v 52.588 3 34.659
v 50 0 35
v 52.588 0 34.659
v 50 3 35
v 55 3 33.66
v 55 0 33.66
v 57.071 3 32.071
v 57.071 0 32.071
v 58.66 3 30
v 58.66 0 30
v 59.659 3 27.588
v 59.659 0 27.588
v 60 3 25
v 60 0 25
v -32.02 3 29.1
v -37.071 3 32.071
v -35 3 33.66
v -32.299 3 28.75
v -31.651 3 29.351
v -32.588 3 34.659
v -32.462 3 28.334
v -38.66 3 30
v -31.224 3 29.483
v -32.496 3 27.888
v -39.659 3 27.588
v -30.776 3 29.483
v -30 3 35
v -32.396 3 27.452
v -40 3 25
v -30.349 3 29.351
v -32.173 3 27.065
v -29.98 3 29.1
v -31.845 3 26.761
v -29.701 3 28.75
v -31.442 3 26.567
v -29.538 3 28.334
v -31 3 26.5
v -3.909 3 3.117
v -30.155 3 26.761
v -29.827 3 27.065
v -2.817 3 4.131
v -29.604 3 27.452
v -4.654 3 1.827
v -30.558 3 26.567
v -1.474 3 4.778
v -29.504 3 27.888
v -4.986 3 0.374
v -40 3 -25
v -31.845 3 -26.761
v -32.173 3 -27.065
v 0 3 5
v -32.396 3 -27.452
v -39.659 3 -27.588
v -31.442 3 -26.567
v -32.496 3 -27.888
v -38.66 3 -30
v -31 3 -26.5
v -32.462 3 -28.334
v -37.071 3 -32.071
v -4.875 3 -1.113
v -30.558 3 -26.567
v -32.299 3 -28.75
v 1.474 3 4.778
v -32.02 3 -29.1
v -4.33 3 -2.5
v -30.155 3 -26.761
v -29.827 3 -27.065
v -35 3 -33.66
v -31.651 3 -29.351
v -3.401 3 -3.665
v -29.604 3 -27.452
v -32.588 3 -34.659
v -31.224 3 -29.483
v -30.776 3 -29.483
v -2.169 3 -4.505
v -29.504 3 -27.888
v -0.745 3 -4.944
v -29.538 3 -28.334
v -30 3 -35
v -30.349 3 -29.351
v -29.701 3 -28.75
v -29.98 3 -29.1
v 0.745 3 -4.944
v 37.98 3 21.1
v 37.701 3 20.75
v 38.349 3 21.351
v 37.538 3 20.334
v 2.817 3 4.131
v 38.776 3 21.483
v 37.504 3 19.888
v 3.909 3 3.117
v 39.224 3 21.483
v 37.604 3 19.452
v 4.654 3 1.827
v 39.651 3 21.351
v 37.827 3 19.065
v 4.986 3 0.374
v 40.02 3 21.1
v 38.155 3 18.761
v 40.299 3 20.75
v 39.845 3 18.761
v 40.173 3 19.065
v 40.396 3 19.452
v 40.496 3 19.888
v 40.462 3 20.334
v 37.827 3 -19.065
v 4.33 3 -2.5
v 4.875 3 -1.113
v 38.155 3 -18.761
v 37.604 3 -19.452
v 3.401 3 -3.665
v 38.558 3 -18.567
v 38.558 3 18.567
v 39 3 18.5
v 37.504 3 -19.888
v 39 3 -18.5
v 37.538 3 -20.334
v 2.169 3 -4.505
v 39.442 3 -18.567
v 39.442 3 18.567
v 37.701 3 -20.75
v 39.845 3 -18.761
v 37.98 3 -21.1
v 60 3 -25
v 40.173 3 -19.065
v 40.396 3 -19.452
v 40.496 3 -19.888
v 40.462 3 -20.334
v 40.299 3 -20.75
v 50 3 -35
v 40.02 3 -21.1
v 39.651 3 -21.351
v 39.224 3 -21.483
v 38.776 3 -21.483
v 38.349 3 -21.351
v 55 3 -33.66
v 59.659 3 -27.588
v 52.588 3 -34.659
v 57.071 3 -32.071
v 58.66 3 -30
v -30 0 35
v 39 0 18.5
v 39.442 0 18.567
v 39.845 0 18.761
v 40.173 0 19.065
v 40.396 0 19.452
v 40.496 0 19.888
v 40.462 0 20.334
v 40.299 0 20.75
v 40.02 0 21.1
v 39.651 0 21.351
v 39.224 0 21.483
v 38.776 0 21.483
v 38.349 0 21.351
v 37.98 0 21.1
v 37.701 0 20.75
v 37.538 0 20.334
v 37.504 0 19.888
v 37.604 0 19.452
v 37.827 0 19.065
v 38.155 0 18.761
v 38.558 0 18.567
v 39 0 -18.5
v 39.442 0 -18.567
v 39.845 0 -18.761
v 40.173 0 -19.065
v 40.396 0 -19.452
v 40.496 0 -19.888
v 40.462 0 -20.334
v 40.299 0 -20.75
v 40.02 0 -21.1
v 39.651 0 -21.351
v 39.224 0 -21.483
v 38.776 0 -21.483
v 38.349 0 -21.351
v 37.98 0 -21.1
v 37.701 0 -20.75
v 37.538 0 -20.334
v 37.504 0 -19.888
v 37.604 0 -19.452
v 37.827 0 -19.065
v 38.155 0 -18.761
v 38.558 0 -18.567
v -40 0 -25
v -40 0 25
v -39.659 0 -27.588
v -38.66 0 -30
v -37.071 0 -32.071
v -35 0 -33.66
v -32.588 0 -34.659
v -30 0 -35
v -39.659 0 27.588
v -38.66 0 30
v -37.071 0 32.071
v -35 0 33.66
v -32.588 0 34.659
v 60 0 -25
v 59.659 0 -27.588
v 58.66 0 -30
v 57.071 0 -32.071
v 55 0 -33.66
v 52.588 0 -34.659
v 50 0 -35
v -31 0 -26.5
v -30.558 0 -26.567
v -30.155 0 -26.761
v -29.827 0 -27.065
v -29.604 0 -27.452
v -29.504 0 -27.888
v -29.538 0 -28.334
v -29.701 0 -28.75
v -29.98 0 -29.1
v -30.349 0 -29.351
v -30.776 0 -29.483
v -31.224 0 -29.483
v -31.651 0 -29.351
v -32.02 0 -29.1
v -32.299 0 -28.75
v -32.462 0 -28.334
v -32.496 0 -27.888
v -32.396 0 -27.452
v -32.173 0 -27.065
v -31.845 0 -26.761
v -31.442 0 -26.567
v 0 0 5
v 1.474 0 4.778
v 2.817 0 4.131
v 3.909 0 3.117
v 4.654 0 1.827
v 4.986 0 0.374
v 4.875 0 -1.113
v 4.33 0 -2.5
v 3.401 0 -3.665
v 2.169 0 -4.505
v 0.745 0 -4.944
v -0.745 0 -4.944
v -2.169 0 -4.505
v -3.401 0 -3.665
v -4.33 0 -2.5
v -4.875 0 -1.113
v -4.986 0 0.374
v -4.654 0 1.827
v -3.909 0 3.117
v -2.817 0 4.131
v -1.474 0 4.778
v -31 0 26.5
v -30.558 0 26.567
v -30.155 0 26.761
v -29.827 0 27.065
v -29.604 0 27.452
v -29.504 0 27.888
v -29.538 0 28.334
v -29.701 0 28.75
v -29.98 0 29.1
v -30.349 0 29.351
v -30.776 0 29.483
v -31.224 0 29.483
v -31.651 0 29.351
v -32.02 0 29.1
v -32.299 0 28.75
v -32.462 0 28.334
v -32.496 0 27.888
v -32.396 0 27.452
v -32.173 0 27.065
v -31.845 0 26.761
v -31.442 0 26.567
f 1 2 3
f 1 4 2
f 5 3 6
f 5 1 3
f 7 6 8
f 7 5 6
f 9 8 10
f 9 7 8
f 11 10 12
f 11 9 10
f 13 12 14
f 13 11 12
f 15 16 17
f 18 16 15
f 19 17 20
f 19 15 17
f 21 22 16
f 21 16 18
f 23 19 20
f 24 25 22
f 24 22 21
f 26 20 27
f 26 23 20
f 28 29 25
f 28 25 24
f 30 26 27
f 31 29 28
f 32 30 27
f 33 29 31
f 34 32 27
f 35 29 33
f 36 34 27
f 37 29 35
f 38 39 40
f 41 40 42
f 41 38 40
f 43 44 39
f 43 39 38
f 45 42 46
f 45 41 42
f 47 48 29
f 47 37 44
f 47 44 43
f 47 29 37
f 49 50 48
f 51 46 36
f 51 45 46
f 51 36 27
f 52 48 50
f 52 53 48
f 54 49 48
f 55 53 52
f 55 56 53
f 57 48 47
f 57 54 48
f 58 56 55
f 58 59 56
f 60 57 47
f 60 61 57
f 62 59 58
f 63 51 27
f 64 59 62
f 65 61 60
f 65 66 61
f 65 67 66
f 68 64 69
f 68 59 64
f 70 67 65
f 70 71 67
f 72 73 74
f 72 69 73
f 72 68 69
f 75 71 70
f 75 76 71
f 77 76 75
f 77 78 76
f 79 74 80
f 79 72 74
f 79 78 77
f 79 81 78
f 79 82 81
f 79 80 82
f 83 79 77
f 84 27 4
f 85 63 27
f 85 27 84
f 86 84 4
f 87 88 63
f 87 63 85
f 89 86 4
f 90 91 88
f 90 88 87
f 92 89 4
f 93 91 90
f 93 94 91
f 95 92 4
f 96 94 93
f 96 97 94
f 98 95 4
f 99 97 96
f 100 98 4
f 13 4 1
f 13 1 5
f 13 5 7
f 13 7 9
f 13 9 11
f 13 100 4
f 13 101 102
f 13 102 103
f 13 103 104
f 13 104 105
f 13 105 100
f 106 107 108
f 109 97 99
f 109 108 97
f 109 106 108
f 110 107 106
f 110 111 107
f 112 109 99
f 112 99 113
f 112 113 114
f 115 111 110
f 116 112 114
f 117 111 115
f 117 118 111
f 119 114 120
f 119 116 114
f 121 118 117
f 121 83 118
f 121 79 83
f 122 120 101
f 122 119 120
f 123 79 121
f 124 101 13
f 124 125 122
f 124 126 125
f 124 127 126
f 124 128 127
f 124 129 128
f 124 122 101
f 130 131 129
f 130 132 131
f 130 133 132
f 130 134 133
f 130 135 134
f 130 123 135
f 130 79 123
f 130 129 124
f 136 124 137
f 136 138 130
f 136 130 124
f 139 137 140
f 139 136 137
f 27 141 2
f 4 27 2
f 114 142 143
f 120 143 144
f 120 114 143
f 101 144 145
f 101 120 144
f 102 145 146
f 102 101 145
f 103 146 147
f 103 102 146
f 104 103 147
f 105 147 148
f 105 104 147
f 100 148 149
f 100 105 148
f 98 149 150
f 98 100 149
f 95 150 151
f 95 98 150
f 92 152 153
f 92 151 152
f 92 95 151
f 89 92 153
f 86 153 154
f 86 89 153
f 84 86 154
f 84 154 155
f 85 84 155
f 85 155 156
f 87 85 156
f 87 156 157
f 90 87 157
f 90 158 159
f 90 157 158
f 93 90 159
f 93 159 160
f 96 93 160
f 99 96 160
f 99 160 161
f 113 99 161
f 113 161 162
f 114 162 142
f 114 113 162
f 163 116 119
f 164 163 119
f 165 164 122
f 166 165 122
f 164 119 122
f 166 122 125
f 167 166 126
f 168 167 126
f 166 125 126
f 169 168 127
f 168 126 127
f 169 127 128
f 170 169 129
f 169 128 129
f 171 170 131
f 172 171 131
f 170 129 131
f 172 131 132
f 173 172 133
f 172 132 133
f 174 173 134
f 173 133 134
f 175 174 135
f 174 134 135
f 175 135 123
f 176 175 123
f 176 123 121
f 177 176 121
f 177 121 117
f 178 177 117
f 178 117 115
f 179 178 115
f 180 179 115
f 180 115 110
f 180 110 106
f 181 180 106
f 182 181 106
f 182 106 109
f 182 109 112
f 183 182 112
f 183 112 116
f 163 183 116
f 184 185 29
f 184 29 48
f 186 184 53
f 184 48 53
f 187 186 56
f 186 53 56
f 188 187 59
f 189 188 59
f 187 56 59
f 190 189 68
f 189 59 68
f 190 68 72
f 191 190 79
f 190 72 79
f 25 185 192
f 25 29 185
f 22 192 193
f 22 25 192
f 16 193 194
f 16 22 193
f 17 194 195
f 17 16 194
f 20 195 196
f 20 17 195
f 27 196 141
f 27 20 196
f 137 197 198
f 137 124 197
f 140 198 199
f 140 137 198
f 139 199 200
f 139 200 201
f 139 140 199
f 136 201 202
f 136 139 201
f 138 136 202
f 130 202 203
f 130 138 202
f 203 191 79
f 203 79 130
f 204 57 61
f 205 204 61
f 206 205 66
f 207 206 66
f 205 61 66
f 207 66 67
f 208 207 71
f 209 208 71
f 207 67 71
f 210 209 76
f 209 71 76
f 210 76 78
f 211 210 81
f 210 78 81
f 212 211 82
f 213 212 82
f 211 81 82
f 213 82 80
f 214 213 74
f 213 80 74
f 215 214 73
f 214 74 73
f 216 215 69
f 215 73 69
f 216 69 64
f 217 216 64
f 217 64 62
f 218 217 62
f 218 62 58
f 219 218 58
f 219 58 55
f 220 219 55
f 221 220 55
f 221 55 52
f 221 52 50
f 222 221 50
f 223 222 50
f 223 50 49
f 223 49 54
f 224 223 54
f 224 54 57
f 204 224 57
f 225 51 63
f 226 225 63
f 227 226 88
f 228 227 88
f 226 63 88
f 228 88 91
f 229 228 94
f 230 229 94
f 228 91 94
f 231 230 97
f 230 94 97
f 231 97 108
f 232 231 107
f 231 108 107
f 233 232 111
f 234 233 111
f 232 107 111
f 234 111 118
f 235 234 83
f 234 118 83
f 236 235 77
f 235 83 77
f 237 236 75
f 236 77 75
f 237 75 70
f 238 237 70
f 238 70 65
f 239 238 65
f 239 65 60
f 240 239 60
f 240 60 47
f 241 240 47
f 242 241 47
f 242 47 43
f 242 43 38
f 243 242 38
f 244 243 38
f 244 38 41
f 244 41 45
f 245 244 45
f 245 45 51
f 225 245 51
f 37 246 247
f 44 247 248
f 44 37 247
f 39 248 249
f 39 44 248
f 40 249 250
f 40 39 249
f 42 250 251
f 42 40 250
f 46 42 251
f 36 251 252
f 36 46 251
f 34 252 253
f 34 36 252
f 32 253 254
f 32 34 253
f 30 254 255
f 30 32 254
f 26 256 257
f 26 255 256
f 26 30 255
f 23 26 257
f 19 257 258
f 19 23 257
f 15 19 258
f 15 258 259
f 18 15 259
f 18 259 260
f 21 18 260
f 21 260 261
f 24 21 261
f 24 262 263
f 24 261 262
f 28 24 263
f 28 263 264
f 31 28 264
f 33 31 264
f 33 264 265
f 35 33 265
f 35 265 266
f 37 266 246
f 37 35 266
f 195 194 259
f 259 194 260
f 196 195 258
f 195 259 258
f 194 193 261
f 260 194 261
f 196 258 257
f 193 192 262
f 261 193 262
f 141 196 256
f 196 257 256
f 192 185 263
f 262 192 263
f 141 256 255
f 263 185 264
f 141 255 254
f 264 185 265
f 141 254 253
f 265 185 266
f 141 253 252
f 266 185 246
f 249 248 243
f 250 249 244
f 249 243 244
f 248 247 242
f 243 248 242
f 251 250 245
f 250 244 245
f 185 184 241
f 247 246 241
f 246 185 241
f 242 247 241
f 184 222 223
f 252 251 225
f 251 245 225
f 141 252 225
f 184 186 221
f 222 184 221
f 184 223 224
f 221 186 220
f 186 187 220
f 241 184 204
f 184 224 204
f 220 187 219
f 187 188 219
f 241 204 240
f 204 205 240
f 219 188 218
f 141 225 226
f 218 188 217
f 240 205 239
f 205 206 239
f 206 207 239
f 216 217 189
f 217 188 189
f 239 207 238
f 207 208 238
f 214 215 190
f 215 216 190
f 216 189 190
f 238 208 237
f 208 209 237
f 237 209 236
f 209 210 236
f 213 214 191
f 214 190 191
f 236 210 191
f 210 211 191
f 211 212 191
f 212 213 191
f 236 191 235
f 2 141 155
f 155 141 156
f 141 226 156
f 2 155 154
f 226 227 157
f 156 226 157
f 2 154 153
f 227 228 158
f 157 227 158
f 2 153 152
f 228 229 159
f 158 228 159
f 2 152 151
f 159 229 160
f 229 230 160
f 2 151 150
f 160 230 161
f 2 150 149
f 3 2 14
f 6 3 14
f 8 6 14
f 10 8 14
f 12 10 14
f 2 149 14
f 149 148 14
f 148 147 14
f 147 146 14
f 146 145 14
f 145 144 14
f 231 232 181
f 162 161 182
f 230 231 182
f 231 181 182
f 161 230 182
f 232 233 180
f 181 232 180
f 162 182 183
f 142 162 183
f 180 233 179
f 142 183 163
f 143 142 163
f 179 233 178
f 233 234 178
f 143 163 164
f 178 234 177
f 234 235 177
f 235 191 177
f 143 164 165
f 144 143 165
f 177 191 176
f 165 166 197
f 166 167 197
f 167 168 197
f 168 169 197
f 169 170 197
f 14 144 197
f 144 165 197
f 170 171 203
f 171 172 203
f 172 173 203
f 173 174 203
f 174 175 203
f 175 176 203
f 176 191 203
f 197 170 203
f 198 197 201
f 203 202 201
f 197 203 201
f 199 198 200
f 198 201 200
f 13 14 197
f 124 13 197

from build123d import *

# Parameters (mm, degrees)
SKETCH_1_W          = 100
SKETCH_1_H          = 70
EXTRUDE_1_DEPTH     = 3
FILLET_1_R          = 10
SKETCH_2_R          = 5
CUT_EXTRUDE_1_DEPTH = 70.526973183
SKETCH_3_R          = 1.5
CUT_EXTRUDE_2_DEPTH = 70.526973183


with BuildPart() as part:
    # 草图1 → 凸台-拉伸1 (new body)
    with BuildSketch(Plane(origin=(0, 0, 0), x_dir=(1, 0, 0), z_dir=(0, 1, 0))):
        with Locations((10, 0)):
            Rectangle(SKETCH_1_W, SKETCH_1_H)
    extrude(amount=EXTRUDE_1_DEPTH)

    # 圆角1
    fillet_1_edges = [part.edges().sort_by_distance(p)[0] for p in [
        (-40, 1.5, -35),
        (60, 1.5, -35),
        (60, 1.5, 35),
        (-40, 1.5, 35),
    ]]
    fillet(fillet_1_edges, radius=FILLET_1_R)

    # 草图2 → 切除-拉伸1 (cut, through all)
    with BuildSketch(Plane(origin=(0, 3, 0), x_dir=(1, 0, 0), z_dir=(0, 1, 0))):
        with Locations(Location((0, 0, 0), (0, 0, 270))):
            Circle(SKETCH_2_R)
    extrude(amount=-CUT_EXTRUDE_1_DEPTH, mode=Mode.SUBTRACT)

    # 草图3 → 切除-拉伸2 (cut, through all)
    with BuildSketch(Plane(origin=(0, 3, 0), x_dir=(1, 0, 0), z_dir=(0, 1, 0))):
        with Locations(Location((-31, 28, 0), (0, 0, 270))):
            Circle(SKETCH_3_R)
        with Locations(Location((39, 20, 0), (0, 0, 270))):
            Circle(SKETCH_3_R)
    cut_extrude_2 = extrude(amount=-CUT_EXTRUDE_2_DEPTH, mode=Mode.SUBTRACT)

    # 镜向1: 切除-拉伸2 across plane
    add(cut_extrude_2.mirror(Plane.XY), mode=Mode.SUBTRACT)


solid = part.part
